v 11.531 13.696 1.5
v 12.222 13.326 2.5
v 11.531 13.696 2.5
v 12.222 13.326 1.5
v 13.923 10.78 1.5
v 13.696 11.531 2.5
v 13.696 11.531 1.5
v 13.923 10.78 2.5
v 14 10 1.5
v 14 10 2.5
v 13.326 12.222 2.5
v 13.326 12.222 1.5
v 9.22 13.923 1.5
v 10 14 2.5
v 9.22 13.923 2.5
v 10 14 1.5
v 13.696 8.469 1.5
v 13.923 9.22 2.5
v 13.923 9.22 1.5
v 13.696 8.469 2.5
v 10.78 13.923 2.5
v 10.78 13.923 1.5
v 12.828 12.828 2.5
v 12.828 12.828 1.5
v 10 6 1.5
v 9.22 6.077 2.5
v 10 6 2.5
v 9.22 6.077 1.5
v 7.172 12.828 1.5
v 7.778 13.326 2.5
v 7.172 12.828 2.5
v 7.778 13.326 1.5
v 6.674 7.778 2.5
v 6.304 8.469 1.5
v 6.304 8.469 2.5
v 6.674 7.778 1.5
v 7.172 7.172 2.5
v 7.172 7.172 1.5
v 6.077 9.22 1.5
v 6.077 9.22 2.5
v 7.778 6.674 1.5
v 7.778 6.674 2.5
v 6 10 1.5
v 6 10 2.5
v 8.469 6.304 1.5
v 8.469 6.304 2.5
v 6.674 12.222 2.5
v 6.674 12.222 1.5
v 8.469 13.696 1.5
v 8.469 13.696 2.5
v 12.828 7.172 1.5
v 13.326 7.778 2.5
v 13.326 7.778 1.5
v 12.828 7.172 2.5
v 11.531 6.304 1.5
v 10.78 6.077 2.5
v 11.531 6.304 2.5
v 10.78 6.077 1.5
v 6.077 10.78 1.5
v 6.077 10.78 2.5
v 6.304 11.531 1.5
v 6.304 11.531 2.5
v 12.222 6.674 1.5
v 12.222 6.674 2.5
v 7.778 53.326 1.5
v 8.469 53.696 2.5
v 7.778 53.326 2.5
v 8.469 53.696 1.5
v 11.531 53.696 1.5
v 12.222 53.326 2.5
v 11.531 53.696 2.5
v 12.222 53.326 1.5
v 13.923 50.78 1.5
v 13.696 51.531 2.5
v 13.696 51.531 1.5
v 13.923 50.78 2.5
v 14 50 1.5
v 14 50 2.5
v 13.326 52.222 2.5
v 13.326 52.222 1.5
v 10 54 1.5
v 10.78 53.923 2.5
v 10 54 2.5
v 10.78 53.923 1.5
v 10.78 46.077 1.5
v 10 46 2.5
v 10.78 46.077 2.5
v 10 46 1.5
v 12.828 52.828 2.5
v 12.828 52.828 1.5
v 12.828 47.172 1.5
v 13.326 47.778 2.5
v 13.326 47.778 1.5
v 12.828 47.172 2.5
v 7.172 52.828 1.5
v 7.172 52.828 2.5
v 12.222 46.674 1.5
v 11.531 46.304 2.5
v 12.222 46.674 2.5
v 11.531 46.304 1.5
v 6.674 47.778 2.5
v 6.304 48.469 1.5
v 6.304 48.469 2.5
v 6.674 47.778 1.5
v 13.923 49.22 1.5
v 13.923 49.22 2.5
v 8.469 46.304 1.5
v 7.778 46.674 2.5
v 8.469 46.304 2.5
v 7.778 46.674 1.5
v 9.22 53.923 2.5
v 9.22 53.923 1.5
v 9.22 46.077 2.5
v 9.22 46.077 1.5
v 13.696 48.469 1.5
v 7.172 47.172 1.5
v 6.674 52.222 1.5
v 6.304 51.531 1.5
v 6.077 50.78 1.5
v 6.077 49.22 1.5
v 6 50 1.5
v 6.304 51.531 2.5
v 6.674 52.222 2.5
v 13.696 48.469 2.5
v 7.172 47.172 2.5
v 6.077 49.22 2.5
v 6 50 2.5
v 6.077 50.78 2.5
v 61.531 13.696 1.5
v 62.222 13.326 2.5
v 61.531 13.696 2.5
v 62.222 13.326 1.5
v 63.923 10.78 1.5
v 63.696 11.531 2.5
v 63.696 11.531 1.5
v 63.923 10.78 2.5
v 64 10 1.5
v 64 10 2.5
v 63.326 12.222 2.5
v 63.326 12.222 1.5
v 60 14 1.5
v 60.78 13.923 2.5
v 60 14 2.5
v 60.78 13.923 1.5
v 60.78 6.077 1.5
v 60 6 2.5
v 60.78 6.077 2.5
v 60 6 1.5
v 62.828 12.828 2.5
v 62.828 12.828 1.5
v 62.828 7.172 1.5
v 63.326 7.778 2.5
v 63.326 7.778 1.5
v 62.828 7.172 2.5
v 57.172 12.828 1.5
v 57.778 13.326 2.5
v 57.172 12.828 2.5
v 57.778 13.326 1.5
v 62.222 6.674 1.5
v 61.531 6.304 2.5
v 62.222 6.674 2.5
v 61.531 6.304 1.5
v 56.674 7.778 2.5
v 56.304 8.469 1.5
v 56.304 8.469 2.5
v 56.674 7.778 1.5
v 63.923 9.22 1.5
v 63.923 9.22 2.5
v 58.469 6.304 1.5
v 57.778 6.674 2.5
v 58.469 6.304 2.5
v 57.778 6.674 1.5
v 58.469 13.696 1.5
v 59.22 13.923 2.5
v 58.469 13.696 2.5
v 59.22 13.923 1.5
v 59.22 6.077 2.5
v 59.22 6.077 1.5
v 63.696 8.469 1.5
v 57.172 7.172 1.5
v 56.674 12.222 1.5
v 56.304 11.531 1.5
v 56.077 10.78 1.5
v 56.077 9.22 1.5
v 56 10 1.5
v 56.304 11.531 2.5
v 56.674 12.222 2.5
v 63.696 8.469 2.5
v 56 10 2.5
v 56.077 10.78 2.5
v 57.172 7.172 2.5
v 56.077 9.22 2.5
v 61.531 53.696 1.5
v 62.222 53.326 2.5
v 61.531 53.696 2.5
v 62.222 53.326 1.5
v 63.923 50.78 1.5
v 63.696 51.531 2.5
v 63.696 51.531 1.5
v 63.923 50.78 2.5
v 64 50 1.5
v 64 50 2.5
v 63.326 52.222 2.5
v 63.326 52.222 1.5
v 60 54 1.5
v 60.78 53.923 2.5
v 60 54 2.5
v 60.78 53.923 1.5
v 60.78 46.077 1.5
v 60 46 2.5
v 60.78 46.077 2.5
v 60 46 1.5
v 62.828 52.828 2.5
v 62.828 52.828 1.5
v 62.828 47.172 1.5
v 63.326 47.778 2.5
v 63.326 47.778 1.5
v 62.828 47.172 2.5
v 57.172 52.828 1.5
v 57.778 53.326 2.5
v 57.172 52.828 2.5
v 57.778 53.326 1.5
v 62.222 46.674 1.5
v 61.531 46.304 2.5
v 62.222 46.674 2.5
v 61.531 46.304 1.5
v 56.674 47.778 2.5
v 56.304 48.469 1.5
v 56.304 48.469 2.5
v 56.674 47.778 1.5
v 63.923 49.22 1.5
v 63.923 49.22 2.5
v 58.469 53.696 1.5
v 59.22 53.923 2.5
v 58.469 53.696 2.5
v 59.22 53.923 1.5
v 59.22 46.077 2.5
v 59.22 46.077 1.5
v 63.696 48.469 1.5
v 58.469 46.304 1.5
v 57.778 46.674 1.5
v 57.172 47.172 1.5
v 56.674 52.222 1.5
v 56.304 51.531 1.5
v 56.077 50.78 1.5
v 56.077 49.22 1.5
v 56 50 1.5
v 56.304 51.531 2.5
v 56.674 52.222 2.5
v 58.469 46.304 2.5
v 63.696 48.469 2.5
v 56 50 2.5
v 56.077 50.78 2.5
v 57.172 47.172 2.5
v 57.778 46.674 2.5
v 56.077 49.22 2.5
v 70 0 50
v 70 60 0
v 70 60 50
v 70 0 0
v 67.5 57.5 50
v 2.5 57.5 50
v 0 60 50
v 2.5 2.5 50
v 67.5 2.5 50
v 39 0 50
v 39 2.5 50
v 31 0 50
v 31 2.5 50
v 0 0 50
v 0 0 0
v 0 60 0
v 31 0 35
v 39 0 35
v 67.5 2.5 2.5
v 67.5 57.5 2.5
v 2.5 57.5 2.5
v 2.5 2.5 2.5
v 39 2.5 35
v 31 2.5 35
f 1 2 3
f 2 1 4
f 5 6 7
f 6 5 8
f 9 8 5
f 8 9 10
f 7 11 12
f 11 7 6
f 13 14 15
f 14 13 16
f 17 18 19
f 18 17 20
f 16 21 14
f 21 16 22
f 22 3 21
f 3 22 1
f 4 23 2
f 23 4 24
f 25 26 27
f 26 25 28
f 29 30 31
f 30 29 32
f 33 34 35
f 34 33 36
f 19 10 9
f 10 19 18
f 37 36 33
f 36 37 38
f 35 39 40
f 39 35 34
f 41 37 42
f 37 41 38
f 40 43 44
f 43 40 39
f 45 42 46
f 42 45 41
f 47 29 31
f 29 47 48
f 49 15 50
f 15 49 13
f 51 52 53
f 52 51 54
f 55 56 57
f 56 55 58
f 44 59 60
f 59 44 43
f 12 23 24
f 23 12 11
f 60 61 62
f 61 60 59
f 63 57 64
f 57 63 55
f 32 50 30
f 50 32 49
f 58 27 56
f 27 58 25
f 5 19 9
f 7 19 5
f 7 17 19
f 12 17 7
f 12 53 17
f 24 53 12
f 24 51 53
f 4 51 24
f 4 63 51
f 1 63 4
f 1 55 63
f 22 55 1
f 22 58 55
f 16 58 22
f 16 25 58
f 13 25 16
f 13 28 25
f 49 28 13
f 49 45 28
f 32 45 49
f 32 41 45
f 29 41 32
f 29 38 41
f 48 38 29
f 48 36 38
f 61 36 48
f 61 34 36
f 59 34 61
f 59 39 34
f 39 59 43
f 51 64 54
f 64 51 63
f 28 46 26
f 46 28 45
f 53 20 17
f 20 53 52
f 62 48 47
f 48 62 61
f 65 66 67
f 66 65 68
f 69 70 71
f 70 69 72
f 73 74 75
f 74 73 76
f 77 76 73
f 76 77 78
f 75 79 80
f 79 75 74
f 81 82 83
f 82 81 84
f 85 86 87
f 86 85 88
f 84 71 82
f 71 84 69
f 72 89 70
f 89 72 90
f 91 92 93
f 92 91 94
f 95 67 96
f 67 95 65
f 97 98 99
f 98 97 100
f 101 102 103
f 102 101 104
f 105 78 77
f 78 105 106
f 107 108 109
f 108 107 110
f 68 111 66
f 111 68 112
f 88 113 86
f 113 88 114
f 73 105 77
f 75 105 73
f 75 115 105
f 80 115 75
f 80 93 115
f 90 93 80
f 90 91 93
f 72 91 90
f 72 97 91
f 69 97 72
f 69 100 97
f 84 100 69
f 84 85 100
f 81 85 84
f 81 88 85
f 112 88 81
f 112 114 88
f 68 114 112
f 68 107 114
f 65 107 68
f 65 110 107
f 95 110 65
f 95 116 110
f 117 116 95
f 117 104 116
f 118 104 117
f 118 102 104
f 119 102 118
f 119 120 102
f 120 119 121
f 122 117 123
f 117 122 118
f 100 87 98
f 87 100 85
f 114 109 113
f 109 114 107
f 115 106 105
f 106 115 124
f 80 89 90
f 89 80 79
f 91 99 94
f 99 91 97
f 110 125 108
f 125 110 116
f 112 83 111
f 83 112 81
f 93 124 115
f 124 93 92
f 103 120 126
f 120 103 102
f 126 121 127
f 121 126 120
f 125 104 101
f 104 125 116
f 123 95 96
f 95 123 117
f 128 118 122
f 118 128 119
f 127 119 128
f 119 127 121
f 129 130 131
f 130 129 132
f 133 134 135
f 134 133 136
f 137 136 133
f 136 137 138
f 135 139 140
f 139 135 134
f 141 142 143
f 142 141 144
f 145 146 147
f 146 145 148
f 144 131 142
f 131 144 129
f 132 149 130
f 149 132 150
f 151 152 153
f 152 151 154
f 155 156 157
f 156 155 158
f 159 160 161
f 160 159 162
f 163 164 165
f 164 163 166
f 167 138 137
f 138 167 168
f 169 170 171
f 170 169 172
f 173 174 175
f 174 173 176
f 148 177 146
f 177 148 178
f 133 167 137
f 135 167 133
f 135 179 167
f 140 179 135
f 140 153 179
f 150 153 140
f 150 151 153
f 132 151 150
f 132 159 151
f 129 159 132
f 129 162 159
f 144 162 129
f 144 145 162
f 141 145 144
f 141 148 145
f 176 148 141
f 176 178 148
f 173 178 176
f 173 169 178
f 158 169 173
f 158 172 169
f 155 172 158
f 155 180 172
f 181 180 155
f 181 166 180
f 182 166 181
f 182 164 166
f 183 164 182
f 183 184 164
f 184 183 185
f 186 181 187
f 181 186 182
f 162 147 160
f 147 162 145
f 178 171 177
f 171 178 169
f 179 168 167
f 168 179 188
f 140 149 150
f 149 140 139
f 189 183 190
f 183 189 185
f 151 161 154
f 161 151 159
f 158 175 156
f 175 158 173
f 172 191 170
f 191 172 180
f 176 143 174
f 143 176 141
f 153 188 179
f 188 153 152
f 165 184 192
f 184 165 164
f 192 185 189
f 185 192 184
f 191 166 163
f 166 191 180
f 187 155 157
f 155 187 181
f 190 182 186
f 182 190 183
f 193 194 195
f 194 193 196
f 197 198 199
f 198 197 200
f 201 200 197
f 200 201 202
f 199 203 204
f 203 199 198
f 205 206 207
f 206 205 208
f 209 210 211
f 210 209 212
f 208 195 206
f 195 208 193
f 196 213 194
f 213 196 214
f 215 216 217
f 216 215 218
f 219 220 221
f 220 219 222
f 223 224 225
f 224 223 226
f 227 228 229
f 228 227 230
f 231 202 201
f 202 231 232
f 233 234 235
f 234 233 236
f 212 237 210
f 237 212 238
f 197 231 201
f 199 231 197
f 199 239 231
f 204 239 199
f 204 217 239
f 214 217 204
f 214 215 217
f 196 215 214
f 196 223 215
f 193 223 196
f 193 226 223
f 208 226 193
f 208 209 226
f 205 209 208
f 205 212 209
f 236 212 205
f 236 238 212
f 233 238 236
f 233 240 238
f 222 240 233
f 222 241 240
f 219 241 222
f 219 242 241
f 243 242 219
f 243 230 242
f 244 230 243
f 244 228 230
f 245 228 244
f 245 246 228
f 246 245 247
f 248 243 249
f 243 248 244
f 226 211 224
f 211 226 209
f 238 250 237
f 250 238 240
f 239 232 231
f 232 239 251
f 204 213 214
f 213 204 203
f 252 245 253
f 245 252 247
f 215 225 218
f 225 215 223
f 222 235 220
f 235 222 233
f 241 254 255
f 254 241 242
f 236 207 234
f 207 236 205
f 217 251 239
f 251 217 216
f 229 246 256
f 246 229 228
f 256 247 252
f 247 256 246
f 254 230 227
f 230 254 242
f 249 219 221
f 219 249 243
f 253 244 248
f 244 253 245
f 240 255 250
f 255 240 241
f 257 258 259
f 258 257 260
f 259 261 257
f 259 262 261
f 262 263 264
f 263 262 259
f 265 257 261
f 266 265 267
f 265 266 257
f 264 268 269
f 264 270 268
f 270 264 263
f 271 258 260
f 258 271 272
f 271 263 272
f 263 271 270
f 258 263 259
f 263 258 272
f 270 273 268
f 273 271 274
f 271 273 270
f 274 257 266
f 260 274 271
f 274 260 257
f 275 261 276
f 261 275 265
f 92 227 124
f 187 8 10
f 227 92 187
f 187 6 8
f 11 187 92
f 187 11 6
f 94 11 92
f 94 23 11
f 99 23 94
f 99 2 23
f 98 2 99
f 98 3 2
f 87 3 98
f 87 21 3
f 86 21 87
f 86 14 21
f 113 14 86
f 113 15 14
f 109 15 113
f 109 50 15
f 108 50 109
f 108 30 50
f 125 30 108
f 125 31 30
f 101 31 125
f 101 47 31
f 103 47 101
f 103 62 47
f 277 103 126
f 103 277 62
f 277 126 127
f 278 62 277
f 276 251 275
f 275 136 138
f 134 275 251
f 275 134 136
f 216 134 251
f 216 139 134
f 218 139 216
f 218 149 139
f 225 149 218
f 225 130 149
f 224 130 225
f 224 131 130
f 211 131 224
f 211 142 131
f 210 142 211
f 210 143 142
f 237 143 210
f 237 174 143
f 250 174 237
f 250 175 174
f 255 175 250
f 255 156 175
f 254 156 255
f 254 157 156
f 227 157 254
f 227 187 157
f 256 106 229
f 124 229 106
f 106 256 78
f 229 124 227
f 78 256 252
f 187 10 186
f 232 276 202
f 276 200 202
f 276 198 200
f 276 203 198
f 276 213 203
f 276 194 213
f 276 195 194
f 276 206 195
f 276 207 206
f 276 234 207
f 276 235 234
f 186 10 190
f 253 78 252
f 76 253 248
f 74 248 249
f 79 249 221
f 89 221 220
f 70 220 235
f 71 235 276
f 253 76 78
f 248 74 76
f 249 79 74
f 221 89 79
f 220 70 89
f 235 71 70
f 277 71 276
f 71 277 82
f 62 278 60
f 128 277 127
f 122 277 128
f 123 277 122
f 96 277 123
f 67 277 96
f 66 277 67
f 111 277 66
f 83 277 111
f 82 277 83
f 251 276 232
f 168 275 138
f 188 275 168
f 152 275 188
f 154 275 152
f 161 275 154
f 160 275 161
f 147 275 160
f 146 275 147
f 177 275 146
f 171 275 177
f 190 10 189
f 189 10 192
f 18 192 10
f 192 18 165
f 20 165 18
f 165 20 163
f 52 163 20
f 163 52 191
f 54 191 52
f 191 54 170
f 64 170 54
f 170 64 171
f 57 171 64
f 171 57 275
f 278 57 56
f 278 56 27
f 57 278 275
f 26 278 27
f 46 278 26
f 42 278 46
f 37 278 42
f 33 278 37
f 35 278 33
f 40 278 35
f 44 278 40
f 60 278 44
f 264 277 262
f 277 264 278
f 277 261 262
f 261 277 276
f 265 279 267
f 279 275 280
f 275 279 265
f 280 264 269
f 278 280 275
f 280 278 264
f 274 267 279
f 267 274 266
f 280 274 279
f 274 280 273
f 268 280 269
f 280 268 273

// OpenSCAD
$fn = 32;

// ----------------------------------------------------------------------
// Enclosure box: both enclosure
// ----------------------------------------------------------------------

// --- parameters (mm) ---
box_l = 70;               // outer length, X
box_w = 60;               // outer width, Y
box_h = 50;               // outer height
wall_t = 2.5;             // wall thickness
boss_r = 4;               // corner boss radius
hole_r = 1.5;             // boss screw hole radius
boss_in = 10;             // boss inset from the corners
notch_w = 8;              // cable notch width
notch_h = 15;             // cable notch height

inner_h = box_h - wall_t;  // cavity depth
boss_h = inner_h - 2;  // corner boss height

difference() {
  cube([box_l, box_w, box_h]);
  translate([wall_t, wall_t, wall_t])
    cube([box_l - 2 * wall_t, box_w - 2 * wall_t, box_h]);
  for (sx = [0, 1], sy = [0, 1])
    translate([sx ? box_l - boss_in : boss_in,
               sy ? box_w - boss_in : boss_in, wall_t - 1]) {
      cylinder(r = boss_r, h = boss_h);
      translate([0, 0, boss_h - 4])
        cylinder(r = hole_r, h = 5);
    }
  translate([box_l / 2 - notch_w / 2, -1, box_h - notch_h])
    cube([notch_w, wall_t + 2, notch_h + 1]);
}
